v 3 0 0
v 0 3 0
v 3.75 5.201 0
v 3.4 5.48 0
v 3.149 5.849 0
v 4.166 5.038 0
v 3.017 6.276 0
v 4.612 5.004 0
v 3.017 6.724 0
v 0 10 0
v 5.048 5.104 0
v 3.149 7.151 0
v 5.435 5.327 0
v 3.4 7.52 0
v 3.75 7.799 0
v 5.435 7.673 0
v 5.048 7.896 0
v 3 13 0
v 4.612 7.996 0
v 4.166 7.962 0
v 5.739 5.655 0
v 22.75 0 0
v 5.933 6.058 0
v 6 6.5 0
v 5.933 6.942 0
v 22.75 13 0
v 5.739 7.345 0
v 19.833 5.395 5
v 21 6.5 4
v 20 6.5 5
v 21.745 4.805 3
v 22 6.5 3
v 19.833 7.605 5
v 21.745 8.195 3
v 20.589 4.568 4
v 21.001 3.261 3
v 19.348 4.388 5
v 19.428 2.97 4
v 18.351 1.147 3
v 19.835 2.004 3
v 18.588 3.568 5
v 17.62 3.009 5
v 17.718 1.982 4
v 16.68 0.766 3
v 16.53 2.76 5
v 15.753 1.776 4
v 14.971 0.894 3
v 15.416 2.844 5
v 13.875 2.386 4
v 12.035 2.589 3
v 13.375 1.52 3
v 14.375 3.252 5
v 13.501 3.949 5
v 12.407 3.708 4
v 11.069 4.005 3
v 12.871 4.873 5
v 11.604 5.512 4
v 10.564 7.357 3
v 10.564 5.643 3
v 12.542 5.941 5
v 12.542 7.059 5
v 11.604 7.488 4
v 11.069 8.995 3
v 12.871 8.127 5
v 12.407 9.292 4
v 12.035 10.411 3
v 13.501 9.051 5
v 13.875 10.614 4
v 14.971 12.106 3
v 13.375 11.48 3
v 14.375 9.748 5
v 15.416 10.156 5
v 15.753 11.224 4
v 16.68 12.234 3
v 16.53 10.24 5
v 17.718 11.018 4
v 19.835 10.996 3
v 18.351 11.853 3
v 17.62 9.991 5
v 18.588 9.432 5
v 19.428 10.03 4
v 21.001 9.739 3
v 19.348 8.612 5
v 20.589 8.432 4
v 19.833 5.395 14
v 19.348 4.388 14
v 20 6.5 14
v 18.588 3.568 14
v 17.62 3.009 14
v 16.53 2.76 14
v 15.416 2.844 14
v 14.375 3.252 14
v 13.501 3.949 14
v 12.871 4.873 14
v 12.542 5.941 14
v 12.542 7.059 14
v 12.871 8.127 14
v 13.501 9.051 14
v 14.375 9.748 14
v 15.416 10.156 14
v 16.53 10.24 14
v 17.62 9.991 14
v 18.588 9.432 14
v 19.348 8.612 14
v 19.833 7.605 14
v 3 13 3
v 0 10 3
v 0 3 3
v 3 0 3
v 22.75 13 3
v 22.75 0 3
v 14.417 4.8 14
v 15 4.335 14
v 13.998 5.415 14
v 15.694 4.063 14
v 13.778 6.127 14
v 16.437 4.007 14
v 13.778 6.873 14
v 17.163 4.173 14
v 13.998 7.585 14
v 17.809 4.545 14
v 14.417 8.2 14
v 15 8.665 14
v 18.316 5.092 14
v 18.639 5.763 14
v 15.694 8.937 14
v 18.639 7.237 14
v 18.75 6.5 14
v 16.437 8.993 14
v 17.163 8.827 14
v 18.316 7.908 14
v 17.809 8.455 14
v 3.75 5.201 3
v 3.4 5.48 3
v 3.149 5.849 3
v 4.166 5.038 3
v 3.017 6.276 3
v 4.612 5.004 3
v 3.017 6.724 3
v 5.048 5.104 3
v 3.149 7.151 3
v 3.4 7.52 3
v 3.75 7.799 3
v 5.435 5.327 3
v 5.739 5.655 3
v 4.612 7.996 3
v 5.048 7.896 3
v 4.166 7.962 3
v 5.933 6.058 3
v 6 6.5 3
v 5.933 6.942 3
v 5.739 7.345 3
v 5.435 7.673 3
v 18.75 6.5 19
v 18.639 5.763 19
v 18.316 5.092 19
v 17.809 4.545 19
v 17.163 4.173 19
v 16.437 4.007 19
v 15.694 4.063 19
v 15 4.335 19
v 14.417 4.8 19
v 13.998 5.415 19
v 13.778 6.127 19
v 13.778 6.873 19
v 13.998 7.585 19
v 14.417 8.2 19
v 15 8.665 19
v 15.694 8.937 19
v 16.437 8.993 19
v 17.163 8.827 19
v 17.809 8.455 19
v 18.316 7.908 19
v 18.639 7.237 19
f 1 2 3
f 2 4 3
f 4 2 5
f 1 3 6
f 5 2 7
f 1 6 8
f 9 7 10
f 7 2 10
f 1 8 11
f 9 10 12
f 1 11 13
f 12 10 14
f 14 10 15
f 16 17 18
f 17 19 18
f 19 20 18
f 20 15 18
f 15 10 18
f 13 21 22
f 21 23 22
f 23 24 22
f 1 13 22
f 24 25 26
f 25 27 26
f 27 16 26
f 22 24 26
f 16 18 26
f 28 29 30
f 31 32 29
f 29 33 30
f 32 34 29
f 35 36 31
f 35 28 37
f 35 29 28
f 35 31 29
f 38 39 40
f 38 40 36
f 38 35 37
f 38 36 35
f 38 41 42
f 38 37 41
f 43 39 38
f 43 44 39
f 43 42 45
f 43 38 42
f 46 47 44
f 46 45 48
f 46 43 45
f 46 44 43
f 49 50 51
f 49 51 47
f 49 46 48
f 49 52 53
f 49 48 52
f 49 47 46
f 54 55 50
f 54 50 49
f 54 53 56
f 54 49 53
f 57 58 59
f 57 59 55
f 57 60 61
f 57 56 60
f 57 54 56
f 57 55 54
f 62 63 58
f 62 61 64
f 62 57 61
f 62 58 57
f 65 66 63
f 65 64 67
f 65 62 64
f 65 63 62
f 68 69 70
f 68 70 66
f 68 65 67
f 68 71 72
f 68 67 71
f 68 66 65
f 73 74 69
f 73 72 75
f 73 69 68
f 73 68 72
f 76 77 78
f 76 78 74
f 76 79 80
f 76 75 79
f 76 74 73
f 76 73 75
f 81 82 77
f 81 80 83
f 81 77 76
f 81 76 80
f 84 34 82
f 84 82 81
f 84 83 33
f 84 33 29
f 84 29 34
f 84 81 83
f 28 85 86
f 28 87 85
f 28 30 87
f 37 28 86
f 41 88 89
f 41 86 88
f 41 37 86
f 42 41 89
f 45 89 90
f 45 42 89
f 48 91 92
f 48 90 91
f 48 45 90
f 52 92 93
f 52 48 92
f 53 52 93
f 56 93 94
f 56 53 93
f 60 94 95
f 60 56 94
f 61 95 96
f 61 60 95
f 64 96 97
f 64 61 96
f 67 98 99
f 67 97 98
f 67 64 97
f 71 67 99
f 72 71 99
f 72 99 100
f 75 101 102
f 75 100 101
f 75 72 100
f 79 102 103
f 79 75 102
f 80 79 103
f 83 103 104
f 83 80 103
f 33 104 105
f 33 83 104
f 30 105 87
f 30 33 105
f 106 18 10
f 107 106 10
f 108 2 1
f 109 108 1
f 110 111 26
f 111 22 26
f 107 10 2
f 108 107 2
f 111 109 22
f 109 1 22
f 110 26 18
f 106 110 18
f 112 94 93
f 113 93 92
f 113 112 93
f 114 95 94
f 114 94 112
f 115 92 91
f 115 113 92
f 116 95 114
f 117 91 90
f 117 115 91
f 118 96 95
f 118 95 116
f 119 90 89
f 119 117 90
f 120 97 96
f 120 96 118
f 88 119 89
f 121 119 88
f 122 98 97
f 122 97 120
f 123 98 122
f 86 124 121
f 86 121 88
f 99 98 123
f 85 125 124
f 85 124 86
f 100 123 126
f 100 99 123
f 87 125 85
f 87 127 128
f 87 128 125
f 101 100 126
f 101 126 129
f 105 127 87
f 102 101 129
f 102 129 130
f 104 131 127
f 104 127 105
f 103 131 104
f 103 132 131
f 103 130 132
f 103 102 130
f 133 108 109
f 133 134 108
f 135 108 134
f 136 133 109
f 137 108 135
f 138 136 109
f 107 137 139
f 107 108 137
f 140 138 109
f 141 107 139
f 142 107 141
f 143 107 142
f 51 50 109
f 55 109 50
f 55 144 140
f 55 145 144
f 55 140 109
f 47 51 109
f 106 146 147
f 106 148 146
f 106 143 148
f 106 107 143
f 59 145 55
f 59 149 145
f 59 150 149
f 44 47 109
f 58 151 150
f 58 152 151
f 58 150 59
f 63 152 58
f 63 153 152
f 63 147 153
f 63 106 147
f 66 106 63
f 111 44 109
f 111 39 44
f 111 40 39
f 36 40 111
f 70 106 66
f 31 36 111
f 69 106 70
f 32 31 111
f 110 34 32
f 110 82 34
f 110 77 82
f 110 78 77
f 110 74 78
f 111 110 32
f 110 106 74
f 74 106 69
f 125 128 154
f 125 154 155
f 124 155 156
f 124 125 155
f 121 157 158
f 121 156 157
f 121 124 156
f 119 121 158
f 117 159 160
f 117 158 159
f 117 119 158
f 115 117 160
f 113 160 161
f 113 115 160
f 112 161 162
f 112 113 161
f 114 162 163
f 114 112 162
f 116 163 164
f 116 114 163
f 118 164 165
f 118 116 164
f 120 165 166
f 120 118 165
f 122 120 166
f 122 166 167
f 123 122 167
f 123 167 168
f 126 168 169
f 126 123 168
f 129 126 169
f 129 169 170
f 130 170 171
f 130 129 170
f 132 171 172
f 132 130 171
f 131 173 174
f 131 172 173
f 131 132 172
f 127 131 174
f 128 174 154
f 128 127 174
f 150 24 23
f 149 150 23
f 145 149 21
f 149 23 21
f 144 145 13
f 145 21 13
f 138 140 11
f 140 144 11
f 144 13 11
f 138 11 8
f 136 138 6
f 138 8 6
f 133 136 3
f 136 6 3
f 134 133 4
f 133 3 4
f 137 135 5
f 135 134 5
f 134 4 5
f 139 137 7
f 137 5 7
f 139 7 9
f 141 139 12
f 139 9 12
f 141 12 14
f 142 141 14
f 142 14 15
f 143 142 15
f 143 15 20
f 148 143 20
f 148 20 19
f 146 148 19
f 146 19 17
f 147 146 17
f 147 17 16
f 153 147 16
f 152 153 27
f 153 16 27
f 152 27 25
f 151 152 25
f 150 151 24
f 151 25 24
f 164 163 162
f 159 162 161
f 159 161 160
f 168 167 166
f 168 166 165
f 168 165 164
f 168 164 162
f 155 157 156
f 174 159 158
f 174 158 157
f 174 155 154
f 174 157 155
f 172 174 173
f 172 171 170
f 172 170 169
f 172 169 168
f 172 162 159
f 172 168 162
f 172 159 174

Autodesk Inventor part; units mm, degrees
ref_plane "YZ Plane" through (0, 0, 0) normal (1, 0, 0) x (0, 1, 0)
ref_plane "XZ Plane" through (0, 0, 0) normal (0, 1, 0) x (-1, 0, 0)
ref_plane "XY Plane" through (0, 0, 0) normal (0, 0, 1) x (1, 0, 0)
sketch "Эскиз1" plane through (0, 0, 0) normal (0, 0, 1) x (1, 0, 0)
  line L0 (3, 0) -> (22.75, 0)
  line L1 (22.75, 0) -> (22.75, 13)
  line L2 (22.75, 13) -> (3, 13)
  line L3 (0, 10) -> (0, 3)
  circle A0 centre (16.25, 6.5) radius 8 construction
  circle A1 centre (16.25, 6.5) radius 2.5
  circle A2 centre (4.5, 6.5) radius 1.5
  line L4 (0, 6.5) -> (22.75, 6.5) construction
  circle A3 centre (4.5, 6.5) radius 2.75 construction
  line L5 (3, 13) -> (0, 10)
  line L6 (0, 3) -> (3, 0)
  circle A4 centre (16.25, 6.5) radius 3.75
  point P0 (0, 0)
  point P1 (0, 13)
  dimension "d0" = 16
  dimension "d3" = 3
  dimension "d6" = 5.5
  dimension "d7" = 1
  dimension "d9" = 3
  dimension "d10" = 3
  dimension "d11" = 3
  dimension "d12" = 3
  dimension "d13" = 7.5
  dimension "d23" = 6.5
  dimension "d24" = 6.5
extrude "Выдавливание1" add sketch "Эскиз1" along normal blind 3 contours L6 L3 L5 L2 L1 L0
extrude "Выдавливание2" add sketch "Эскиз1" along normal blind 14 contours A4
extrude "Выдавливание3" add sketch "Эскиз1" along normal blind 19 contours A1
chamfer "Фаска1" distance 2 angle 45 1 edges at (12.5, 6.5, 3)
equation "\"d10\" = d9"
equation "\"d11\" = d9"
equation "\"d12\" = d11"
properties part number "Концентратор"
